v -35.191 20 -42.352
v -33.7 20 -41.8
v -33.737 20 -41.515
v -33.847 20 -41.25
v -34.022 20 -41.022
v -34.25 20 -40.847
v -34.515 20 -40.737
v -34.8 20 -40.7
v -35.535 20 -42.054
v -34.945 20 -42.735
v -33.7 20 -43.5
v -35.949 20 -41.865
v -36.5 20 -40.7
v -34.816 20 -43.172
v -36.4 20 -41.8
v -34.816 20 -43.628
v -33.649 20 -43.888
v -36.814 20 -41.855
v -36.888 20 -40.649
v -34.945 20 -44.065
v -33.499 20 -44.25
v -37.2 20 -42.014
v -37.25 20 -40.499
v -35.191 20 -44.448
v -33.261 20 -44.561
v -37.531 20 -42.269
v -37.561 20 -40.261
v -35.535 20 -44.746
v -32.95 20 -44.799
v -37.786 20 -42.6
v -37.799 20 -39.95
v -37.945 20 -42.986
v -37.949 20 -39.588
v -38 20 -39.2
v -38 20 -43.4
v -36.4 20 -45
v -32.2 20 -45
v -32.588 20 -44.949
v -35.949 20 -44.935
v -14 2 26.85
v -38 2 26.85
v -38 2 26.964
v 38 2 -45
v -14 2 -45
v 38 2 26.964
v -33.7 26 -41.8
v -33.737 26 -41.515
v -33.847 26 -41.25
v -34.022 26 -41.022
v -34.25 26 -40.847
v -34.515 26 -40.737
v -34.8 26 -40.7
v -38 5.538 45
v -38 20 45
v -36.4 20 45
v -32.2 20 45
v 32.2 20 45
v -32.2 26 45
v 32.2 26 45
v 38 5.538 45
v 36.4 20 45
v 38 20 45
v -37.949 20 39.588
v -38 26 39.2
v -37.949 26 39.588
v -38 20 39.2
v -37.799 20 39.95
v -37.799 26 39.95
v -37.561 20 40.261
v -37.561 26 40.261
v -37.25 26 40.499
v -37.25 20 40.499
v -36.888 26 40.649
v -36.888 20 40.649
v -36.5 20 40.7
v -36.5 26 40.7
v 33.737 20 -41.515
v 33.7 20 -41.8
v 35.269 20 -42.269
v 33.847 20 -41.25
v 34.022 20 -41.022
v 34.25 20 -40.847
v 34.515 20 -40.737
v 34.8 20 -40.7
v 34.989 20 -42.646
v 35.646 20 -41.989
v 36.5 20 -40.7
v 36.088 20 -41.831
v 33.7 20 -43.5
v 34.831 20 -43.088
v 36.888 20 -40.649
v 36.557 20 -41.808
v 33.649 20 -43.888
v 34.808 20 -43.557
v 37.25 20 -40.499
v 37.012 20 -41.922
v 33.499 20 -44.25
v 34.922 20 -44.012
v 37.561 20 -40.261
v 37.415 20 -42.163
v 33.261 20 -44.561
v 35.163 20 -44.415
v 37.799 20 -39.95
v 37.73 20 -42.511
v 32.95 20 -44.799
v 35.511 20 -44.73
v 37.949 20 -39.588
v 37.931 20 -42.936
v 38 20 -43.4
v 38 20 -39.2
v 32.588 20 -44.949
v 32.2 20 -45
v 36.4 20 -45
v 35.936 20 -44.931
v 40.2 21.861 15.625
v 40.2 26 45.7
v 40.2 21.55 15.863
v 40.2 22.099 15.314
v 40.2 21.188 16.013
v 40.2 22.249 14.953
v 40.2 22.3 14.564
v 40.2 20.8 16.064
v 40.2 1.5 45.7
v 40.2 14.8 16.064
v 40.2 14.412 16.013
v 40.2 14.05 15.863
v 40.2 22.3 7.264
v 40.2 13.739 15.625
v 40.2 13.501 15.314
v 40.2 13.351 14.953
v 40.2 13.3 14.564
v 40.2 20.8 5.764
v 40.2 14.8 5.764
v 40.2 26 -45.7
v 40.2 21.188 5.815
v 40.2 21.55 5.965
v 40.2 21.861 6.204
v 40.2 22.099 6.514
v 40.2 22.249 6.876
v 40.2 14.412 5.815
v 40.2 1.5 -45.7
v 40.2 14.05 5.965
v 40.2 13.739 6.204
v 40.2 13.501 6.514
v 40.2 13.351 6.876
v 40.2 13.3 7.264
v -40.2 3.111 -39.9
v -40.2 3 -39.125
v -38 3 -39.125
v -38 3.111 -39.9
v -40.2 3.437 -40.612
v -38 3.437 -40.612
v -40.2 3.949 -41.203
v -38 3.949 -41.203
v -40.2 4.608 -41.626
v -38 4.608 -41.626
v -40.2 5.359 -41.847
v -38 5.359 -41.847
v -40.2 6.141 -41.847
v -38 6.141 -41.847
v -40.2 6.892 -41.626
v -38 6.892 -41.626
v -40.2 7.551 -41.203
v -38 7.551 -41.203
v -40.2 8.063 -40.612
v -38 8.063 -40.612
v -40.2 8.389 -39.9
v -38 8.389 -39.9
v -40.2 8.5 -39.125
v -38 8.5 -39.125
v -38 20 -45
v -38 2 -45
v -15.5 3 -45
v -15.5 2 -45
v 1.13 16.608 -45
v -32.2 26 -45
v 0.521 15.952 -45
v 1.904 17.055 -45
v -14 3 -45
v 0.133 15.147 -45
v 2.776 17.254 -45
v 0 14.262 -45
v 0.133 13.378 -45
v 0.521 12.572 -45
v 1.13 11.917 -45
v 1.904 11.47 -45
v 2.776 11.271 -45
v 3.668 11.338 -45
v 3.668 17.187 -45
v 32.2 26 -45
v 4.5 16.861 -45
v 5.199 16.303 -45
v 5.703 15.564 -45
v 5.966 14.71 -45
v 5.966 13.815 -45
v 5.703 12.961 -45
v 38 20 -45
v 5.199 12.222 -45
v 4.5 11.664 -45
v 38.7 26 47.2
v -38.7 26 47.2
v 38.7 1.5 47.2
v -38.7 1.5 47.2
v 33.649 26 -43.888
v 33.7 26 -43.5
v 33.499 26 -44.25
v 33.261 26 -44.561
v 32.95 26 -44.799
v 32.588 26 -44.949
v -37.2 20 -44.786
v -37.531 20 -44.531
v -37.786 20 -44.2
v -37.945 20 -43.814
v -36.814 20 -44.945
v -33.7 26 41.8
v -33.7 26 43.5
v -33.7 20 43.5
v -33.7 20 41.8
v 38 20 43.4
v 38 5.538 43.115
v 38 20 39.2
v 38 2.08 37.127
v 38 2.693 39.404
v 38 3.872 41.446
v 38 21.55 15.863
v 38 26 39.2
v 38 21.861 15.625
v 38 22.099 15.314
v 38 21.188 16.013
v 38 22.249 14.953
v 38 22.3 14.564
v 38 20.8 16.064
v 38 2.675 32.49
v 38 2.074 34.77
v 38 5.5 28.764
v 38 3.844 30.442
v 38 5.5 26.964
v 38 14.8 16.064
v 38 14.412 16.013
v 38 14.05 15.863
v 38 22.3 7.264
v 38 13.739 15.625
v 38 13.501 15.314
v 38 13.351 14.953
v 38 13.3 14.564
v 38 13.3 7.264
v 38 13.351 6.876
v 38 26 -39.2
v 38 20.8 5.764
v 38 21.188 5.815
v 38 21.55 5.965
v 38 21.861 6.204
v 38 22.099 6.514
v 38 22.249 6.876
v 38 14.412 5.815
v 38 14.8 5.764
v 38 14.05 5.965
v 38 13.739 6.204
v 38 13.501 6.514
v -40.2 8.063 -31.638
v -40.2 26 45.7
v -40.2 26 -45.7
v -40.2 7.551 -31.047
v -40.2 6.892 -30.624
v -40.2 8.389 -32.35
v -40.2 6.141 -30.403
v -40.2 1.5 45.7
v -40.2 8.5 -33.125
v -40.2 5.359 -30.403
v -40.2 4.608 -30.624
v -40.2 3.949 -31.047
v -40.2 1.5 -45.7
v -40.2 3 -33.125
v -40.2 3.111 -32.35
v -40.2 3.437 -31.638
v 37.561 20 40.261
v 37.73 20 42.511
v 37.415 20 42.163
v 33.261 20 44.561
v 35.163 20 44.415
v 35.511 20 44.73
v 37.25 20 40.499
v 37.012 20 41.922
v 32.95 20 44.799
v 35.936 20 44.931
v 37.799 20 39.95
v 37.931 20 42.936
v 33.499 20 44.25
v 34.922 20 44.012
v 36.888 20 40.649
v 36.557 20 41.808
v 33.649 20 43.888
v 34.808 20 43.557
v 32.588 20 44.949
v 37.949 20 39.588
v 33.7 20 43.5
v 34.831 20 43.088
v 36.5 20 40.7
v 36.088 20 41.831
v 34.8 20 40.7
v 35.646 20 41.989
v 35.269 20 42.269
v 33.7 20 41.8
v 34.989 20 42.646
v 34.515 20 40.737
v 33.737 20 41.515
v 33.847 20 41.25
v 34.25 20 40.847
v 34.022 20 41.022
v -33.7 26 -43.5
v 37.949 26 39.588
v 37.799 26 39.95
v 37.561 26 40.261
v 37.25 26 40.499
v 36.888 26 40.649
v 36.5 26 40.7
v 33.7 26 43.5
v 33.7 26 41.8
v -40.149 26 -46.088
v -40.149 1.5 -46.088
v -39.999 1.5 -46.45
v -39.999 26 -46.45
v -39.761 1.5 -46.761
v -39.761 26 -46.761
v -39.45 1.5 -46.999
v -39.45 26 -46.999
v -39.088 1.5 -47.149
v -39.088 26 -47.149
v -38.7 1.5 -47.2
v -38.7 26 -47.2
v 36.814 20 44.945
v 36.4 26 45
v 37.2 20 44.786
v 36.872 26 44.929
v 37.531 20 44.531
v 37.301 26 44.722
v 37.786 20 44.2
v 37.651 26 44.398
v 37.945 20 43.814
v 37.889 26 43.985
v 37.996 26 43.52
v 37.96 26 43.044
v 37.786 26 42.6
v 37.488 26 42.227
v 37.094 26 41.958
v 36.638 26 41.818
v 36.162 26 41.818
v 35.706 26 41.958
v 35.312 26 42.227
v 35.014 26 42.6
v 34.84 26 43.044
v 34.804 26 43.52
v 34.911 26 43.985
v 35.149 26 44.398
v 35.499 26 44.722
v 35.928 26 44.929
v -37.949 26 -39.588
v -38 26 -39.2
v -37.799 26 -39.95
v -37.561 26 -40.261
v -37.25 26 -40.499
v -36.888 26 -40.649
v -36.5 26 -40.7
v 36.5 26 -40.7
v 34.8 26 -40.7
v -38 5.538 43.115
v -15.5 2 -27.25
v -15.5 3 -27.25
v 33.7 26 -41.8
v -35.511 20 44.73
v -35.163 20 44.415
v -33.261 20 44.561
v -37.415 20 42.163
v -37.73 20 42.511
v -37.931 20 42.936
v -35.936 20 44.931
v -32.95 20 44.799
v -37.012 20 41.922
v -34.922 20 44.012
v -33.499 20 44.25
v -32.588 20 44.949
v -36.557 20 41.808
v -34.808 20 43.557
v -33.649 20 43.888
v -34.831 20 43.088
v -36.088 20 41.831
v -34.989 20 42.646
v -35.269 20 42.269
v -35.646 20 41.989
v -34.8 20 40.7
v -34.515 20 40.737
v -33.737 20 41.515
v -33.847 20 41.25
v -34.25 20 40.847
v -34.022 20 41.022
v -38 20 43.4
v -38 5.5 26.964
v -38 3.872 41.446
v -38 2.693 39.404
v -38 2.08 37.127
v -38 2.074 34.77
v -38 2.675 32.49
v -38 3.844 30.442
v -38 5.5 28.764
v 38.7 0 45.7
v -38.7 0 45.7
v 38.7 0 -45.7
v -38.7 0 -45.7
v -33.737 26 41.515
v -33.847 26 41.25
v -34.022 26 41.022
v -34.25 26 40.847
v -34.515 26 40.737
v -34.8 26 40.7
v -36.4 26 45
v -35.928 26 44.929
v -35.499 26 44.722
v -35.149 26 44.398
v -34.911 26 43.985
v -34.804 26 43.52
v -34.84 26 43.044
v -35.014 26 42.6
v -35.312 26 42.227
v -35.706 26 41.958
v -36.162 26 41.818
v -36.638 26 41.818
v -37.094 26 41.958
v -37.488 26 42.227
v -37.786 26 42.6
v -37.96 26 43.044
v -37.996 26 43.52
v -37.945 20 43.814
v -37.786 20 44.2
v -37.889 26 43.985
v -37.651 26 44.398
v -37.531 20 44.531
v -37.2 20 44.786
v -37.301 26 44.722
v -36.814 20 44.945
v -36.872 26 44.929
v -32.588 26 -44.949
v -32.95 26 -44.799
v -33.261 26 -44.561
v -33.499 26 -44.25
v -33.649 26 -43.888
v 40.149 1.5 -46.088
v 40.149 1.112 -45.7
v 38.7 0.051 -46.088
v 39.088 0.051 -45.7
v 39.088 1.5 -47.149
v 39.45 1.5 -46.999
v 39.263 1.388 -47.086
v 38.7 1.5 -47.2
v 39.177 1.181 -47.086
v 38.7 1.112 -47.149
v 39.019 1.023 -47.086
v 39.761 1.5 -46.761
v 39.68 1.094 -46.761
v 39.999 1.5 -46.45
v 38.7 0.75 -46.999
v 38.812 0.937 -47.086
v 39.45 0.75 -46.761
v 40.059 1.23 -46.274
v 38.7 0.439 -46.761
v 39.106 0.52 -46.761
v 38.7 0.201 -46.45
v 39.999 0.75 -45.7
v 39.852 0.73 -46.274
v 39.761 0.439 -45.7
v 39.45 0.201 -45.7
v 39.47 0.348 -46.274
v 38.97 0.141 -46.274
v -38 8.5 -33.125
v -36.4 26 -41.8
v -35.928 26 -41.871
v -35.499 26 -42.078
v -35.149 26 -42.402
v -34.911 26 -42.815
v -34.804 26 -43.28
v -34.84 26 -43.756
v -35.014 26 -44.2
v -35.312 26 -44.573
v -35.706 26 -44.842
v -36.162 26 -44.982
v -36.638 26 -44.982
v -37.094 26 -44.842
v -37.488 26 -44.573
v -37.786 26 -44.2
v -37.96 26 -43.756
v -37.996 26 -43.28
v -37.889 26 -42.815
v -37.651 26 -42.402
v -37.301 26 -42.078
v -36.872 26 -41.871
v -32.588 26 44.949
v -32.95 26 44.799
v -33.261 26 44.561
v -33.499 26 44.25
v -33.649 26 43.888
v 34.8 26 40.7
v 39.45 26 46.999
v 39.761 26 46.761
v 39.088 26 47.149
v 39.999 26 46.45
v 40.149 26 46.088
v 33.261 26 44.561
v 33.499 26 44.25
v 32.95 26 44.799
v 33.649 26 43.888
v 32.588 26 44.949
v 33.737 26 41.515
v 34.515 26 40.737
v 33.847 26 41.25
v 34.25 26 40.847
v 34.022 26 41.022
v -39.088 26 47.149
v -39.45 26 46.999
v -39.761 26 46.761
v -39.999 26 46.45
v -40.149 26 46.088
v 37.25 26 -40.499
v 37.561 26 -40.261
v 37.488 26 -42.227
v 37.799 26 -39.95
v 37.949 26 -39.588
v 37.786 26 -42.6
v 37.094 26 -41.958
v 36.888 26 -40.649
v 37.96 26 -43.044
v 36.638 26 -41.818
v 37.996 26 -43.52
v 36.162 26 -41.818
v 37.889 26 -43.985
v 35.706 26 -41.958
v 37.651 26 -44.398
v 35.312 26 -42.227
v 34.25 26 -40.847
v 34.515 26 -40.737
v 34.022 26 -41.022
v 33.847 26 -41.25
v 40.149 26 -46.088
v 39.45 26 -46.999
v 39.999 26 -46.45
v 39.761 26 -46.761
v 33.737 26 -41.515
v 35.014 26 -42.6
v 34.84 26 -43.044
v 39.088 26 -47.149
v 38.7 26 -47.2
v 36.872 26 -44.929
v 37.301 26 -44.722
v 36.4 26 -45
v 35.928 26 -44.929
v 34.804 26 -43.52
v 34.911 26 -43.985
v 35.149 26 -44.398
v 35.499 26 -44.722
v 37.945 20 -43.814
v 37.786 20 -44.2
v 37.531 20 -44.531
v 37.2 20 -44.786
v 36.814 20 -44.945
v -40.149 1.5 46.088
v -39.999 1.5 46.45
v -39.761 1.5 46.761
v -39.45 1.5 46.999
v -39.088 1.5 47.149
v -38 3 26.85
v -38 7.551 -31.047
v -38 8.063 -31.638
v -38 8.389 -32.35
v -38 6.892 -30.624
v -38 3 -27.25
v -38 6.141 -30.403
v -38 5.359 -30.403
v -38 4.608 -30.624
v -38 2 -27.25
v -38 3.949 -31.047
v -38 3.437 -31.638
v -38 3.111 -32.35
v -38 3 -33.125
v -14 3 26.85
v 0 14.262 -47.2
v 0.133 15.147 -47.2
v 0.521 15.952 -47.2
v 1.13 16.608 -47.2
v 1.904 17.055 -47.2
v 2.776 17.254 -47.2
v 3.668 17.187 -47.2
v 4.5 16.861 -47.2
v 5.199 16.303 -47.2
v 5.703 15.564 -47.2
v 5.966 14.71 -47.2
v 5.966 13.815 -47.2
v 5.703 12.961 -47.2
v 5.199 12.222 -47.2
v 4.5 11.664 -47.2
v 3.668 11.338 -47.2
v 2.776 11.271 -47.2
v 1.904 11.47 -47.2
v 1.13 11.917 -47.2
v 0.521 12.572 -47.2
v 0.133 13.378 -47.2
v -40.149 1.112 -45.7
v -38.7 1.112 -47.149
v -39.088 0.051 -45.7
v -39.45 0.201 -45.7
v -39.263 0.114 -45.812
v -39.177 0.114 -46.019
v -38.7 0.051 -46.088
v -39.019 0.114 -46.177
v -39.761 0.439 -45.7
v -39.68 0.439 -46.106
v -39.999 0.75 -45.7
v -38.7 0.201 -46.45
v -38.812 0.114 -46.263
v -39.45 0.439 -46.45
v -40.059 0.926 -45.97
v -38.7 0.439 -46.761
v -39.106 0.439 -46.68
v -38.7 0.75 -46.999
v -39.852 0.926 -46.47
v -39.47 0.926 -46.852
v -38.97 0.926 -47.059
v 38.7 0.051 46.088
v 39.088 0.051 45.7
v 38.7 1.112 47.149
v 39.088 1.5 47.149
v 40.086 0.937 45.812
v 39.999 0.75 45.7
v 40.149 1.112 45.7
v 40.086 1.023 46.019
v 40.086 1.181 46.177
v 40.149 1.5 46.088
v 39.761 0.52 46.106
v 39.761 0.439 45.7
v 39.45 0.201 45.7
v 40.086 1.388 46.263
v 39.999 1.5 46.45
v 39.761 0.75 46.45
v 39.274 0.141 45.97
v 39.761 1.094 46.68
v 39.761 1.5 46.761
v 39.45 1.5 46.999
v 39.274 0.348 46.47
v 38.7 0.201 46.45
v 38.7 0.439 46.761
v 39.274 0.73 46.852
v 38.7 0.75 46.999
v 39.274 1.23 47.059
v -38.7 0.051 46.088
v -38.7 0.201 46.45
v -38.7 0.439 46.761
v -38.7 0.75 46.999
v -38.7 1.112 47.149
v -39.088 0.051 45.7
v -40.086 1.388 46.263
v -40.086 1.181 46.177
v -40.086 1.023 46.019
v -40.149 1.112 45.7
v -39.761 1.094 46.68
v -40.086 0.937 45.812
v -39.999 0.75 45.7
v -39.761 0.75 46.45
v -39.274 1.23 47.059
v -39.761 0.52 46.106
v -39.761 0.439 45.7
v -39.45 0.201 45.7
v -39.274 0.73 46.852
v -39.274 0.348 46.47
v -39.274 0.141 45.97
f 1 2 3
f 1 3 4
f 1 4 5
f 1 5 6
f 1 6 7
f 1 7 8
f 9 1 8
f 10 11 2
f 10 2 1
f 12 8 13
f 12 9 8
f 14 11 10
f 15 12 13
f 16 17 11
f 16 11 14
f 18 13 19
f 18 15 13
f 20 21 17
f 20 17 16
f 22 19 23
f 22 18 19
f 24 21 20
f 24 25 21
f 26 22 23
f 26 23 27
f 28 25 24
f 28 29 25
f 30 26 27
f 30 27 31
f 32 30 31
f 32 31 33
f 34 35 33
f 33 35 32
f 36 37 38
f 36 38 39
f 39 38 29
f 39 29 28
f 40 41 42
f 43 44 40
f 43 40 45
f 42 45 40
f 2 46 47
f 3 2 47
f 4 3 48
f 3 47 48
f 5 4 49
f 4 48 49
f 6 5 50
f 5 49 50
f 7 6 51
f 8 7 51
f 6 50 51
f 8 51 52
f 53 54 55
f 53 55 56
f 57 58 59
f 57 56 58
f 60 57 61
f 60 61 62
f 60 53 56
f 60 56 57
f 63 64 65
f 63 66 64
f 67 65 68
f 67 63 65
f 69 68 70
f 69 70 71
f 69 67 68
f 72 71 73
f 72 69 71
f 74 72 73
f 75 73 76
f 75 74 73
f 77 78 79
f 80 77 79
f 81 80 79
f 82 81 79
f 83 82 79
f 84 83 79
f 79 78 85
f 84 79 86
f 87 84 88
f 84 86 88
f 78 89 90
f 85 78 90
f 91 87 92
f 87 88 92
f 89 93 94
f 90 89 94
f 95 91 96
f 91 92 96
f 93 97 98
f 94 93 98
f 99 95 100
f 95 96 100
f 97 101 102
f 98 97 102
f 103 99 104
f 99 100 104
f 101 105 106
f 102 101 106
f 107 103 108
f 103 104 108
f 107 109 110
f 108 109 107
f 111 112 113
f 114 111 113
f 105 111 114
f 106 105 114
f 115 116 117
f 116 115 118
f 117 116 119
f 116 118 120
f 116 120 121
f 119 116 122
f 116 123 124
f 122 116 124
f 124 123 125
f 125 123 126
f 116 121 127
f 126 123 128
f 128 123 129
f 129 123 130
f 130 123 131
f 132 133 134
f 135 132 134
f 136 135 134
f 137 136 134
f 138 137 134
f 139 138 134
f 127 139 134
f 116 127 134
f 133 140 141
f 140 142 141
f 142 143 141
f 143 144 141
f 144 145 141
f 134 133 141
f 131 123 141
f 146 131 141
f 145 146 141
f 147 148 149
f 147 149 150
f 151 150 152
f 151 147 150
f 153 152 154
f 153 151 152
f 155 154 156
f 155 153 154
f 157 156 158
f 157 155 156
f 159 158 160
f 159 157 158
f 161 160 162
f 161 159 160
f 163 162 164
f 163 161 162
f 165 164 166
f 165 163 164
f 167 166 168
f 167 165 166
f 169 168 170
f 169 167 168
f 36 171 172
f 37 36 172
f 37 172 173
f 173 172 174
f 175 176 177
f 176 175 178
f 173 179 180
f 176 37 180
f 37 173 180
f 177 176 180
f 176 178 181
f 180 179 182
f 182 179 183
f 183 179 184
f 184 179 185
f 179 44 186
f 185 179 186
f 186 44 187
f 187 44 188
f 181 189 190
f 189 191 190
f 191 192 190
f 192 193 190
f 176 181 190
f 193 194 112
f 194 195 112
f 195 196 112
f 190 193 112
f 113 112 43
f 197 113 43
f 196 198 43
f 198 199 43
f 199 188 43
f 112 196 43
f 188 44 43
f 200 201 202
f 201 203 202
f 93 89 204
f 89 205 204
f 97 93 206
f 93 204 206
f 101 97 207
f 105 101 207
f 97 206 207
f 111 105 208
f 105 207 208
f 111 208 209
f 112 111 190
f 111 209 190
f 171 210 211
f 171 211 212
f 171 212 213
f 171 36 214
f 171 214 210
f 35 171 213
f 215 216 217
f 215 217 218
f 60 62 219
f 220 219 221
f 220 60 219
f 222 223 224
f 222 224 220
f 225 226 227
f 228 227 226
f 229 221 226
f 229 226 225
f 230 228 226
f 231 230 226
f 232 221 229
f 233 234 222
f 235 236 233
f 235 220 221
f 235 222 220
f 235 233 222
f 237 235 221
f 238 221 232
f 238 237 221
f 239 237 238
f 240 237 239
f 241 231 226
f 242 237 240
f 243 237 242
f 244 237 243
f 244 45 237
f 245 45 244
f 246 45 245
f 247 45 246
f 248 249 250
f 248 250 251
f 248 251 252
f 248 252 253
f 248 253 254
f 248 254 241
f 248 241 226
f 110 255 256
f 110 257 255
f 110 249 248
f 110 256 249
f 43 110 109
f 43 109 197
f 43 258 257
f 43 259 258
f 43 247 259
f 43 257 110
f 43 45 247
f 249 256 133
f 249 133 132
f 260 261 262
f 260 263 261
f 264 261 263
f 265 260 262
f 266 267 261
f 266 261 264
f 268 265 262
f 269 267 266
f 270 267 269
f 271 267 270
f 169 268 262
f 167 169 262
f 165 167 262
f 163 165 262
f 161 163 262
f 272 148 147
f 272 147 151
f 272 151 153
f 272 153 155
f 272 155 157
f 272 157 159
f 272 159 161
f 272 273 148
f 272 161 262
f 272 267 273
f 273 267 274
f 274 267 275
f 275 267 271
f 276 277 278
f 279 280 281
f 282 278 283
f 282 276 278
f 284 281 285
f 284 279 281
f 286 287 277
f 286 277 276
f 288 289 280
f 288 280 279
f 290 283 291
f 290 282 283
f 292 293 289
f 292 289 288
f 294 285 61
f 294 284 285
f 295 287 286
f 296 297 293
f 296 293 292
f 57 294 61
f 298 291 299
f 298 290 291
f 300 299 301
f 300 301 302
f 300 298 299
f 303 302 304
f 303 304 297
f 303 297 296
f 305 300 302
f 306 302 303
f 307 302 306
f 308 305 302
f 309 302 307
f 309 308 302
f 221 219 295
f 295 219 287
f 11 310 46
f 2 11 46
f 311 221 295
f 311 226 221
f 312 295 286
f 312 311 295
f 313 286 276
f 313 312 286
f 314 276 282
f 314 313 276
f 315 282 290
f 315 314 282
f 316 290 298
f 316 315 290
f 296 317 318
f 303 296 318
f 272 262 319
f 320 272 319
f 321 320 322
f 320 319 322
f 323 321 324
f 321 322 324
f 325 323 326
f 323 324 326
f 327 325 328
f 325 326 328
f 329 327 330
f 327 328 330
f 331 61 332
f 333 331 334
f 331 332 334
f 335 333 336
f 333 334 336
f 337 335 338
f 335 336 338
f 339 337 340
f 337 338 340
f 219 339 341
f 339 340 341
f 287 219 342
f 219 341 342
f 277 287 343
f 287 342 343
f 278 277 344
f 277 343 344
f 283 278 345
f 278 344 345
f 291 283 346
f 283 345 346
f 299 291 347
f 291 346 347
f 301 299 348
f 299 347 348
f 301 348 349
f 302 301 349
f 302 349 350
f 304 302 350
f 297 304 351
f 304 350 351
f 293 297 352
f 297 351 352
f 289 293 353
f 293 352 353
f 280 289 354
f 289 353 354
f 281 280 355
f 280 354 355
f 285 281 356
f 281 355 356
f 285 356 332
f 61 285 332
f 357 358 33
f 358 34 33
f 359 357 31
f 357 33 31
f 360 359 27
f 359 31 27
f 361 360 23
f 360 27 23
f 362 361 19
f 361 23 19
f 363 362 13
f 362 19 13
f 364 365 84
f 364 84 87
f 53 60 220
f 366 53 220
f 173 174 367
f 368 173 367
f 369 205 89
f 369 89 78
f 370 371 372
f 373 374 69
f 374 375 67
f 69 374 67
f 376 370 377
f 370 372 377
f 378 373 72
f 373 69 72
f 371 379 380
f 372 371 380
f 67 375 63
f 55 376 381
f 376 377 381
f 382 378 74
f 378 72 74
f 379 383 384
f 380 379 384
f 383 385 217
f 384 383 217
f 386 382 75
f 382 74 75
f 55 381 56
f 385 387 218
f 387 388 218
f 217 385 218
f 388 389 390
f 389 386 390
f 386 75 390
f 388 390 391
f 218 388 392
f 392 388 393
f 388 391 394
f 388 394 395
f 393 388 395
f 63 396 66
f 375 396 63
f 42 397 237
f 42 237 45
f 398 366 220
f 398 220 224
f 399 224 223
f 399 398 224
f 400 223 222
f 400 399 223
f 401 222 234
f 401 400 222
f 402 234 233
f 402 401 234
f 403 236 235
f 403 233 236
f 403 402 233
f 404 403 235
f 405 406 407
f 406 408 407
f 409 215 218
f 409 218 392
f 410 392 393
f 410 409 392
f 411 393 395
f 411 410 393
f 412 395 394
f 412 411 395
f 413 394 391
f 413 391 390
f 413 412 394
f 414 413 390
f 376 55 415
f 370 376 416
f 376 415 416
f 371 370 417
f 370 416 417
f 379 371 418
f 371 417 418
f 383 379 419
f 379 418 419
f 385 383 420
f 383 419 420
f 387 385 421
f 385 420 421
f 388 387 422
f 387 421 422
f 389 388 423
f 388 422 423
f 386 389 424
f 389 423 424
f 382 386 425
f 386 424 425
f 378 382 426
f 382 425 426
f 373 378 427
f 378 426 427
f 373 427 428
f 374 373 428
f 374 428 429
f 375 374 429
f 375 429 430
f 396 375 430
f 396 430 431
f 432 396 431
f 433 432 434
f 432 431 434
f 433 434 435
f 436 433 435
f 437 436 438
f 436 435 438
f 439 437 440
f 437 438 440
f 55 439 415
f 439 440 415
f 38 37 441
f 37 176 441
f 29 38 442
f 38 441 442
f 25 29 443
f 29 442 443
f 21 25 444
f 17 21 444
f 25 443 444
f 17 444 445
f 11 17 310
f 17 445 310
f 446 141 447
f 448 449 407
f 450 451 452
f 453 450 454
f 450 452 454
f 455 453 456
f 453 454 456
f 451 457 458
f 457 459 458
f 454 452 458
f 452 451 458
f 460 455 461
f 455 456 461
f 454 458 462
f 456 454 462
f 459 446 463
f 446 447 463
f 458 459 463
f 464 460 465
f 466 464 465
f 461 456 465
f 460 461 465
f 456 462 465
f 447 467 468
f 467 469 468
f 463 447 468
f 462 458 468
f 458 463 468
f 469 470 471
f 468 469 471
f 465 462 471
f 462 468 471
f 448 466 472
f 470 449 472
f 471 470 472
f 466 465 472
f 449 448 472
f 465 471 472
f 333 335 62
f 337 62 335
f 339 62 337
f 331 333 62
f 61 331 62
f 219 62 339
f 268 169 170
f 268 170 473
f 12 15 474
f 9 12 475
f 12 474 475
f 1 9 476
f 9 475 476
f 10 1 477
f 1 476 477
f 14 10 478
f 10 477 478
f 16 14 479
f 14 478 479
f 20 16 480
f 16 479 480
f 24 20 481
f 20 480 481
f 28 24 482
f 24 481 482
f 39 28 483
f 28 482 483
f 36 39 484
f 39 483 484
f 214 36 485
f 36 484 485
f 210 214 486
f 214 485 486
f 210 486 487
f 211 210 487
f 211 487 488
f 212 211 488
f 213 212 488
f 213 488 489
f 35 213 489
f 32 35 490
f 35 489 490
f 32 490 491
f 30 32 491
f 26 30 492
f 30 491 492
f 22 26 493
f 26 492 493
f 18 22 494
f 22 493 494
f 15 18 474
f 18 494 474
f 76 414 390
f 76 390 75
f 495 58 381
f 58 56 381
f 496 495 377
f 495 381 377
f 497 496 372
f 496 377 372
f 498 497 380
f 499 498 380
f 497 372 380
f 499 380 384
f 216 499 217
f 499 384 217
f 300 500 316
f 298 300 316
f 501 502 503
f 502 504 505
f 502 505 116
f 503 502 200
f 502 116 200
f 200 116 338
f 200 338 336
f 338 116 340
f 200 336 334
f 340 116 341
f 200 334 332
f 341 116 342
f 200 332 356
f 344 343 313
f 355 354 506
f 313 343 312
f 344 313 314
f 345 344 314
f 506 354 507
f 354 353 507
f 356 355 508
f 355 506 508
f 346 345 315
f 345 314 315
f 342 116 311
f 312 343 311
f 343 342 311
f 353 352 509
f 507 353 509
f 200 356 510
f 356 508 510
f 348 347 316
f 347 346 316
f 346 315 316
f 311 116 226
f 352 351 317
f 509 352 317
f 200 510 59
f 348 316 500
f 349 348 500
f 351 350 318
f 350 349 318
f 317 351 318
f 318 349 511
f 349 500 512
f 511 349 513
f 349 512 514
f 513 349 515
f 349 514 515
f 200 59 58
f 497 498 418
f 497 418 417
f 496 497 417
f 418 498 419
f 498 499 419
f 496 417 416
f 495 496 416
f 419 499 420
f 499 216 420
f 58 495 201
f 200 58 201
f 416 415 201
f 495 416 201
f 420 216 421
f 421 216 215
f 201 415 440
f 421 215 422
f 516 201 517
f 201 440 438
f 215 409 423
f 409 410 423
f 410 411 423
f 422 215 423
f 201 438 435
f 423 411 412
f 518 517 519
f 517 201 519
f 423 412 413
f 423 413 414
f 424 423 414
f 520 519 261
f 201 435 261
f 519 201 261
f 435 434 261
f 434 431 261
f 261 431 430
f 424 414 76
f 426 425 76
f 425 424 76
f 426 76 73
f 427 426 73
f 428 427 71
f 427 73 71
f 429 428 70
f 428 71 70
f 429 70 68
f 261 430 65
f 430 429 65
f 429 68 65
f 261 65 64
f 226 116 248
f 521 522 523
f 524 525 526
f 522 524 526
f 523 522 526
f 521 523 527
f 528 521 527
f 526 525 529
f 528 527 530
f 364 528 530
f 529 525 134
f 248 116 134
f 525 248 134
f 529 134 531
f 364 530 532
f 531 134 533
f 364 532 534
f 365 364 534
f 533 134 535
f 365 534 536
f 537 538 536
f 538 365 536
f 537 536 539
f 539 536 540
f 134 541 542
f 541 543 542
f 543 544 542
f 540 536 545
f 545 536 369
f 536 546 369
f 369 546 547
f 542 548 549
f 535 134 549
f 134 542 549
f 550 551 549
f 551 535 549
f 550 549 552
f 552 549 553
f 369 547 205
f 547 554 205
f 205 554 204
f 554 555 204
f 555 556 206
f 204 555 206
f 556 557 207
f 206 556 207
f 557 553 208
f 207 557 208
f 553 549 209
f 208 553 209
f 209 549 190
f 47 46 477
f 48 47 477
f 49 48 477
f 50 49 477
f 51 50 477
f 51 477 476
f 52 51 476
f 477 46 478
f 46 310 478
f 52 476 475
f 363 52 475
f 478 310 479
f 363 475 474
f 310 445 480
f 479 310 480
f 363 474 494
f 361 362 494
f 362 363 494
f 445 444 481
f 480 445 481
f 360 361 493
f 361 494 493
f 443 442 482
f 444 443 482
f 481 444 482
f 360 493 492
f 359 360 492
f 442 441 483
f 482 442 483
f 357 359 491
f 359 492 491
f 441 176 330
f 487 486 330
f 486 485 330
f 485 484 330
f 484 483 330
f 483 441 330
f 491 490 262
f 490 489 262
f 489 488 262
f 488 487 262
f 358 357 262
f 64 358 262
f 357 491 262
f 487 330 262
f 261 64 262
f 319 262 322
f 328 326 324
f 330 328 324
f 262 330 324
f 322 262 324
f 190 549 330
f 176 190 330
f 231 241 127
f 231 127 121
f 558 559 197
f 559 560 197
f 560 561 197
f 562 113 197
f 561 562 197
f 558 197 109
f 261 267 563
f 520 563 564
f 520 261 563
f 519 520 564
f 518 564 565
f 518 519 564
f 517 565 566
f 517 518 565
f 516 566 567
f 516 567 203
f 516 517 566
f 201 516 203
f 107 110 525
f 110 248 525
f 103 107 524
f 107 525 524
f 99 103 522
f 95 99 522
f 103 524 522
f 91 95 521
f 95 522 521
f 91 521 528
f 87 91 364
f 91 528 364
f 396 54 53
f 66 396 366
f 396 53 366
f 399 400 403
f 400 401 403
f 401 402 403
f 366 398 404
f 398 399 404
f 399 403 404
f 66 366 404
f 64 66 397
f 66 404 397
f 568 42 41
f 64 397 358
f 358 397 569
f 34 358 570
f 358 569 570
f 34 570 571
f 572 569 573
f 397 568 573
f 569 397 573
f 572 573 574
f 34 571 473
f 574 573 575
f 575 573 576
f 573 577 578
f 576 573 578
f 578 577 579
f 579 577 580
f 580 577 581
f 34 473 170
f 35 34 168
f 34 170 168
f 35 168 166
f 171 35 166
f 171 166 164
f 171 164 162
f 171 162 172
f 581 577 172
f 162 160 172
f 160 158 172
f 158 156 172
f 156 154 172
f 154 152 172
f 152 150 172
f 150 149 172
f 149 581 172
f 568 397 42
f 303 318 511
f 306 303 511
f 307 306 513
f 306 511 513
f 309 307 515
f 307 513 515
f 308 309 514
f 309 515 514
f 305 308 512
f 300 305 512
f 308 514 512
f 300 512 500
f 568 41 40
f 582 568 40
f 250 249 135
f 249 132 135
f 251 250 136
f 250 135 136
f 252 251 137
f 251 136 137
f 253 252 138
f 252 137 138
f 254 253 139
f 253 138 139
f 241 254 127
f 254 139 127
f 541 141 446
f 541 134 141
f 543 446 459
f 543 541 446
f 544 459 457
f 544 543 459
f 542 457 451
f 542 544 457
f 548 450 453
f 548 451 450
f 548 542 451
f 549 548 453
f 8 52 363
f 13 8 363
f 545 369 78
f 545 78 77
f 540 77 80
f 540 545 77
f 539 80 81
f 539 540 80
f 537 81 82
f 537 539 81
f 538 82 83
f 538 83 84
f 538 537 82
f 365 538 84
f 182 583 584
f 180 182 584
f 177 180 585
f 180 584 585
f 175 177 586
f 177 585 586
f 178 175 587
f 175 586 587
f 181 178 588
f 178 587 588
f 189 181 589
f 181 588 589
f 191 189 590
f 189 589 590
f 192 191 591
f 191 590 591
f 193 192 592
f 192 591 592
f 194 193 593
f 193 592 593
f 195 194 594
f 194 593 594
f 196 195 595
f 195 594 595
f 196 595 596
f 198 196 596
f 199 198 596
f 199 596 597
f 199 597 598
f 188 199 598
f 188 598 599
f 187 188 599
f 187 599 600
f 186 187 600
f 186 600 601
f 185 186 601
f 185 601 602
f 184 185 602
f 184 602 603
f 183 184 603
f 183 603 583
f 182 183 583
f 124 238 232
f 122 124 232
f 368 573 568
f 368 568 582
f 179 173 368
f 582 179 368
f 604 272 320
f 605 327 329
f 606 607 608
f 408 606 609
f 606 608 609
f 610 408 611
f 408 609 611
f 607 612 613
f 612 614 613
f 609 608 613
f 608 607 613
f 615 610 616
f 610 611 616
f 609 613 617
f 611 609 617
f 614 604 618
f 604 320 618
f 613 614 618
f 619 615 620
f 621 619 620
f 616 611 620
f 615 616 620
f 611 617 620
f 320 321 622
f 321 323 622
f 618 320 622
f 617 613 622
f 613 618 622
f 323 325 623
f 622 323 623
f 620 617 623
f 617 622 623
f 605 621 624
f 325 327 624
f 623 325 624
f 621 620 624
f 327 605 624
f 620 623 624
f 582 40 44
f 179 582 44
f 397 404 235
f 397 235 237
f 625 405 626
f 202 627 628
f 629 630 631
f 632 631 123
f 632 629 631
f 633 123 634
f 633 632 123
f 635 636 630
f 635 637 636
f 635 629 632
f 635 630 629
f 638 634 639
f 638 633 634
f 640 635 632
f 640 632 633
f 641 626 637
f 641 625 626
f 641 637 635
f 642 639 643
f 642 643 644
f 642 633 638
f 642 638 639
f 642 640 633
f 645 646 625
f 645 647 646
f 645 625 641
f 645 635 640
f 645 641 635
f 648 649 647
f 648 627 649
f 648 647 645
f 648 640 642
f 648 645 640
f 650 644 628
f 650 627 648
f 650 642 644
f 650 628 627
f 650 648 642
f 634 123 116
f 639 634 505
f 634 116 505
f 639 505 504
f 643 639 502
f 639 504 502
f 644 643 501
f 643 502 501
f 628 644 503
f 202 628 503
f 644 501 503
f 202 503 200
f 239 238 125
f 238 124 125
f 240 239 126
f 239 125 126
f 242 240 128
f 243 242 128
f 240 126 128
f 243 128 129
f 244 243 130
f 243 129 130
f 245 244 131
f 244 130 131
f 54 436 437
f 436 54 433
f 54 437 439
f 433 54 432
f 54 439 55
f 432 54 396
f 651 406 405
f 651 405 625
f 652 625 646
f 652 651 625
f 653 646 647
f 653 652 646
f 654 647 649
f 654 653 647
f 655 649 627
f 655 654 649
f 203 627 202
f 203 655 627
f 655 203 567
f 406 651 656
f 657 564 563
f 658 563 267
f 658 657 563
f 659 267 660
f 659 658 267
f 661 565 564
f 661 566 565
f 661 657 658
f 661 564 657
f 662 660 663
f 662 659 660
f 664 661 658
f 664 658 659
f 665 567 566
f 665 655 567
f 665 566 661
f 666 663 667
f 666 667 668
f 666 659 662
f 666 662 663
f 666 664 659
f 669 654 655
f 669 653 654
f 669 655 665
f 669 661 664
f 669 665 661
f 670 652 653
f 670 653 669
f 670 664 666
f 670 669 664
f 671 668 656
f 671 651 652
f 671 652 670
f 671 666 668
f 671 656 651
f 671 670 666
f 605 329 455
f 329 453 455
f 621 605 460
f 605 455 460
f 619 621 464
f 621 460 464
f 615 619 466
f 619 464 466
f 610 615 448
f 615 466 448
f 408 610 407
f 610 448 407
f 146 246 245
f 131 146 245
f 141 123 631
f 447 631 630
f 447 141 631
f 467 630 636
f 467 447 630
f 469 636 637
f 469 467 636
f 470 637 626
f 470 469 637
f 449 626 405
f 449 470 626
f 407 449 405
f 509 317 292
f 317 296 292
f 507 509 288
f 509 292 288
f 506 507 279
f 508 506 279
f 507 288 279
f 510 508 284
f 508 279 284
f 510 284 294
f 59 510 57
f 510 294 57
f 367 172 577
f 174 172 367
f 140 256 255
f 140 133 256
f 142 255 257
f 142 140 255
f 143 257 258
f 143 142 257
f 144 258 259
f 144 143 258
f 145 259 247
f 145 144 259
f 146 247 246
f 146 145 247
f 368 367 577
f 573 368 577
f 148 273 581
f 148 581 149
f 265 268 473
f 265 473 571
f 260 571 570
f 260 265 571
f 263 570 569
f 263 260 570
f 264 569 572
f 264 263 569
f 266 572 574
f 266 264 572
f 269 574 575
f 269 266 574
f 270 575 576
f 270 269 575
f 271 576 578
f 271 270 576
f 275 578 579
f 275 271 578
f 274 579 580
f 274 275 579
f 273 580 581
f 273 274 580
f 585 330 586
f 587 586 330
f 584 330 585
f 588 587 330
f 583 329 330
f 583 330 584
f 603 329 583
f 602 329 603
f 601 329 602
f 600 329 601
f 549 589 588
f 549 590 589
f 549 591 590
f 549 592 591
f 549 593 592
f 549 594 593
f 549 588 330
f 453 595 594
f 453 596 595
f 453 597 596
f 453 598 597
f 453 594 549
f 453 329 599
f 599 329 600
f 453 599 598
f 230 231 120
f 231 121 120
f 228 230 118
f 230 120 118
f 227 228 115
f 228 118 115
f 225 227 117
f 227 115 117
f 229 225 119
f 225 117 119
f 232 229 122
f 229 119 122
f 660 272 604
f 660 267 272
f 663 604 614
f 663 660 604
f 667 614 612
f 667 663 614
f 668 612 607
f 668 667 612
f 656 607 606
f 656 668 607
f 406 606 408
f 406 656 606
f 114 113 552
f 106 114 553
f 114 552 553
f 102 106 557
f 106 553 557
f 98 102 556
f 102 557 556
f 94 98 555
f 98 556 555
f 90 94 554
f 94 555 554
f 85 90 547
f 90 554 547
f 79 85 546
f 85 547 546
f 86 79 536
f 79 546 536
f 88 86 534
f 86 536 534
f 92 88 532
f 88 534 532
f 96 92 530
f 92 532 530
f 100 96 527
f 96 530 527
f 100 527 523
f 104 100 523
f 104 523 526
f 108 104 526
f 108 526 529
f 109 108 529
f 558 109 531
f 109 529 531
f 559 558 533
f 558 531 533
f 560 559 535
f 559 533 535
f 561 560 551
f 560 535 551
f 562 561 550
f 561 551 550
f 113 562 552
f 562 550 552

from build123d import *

# Parameters (mm, degrees)
SKETCH1_W           = 22.5
SKETCH1_H           = 17.75
SKETCH1_W_2         = 52
SKETCH1_H_2         = 71.85
BOSS_EXTRUDE1_DEPTH = 2
BOSS_EXTRUDE2_DEPTH = 3
SKETCH1_4_W         = 80.4
SKETCH1_4_H         = 94.4
SKETCH1_4_W_2       = 76
SKETCH1_4_H_2       = 90
BOSS_EXTRUDE3_DEPTH = 26
BOSS_EXTRUDE4_DEPTH = 78.2
CUT_EXTRUDE1_START  = -78.2
SKETCH2_3_W         = 10.3
SKETCH2_3_H         = 9
CUT_EXTRUDE1_DEPTH  = 26
CUT_EXTRUDE2_DEPTH  = 26
FILLET1_R           = 1.5
SKETCH4_R           = 3
CUT_EXTRUDE3_DEPTH  = 26
SKETCH5_R           = 1.6
BOSS_EXTRUDE5_DEPTH = 6
FILLET2_R           = 1.5


with BuildPart() as part:
    # Sketch1 → Boss-Extrude1 (new body)
    with BuildSketch(Plane(origin=(0, 0, 0), x_dir=(1, 0, 0), z_dir=(0, 1, 0))):
        Polygon((-38, -26.85), (-14, -26.85), (-14, 45), (-15.5, 45), (-15.5, 27.25), (-38, 27.25), align=None)
        with Locations((-26.75, 36.125)):
            Rectangle(SKETCH1_W, SKETCH1_H)
        with Locations((12, 9.075)):
            Rectangle(SKETCH1_W_2, SKETCH1_H_2)
        Polygon((38, -45), (38, -26.85), (-14, -26.85), (-38, -26.85), (-38, -45), align=None)
    extrude(amount=BOSS_EXTRUDE1_DEPTH)

    # Sketch1<3> → Boss-Extrude2 (add)
    with BuildSketch(Plane(origin=(0, 0, 0), x_dir=(1, 0, 0), z_dir=(0, 1, 0))):
        Polygon((-38, -26.85), (-14, -26.85), (-14, 45), (-15.5, 45), (-15.5, 27.25), (-38, 27.25), align=None)
    extrude(amount=BOSS_EXTRUDE2_DEPTH)

    # Sketch1<4> → Boss-Extrude3 (add)
    with BuildSketch(Plane(origin=(0, 0, 0), x_dir=(1, 0, 0), z_dir=(0, 1, 0))):
        Rectangle(SKETCH1_4_W, SKETCH1_4_H)
        Rectangle(SKETCH1_4_W_2, SKETCH1_4_H_2, mode=Mode.SUBTRACT)
    extrude(amount=BOSS_EXTRUDE3_DEPTH)

    # Sketch2 → Boss-Extrude4 (add)
    with BuildSketch(Plane.ZY.offset(40.2)):
        with BuildLine():
            Line((28.764343606, 5.5), (26.964343606, 5.5))
            Line((26.964343606, 5.5), (26.964343606, 0))
            Line((26.964343606, 0), (41.904953918, 0))
            Line((41.904953918, 0), (47.2, 0))
            Line((47.2, 0), (47.2, 5.5375))
            Line((47.2, 5.5375), (45, 5.5375))
            Line((45, 5.5375), (43.114695317, 5.5375))
            ThreePointArc((43.114695317, 5.5375), (35.948714495, 2.000030985), (28.764343606, 5.5))
        make_face()
    extrude(amount=-BOSS_EXTRUDE4_DEPTH)

    # Sketch2<3> → Cut-Extrude1 (cut)
    with BuildSketch(Plane.ZY.offset(40.2).offset(CUT_EXTRUDE1_START)):
        with Locations((10.914343606, 17.8)):
            Rectangle(SKETCH2_3_W, SKETCH2_3_H)
    extrude(amount=-CUT_EXTRUDE1_DEPTH, mode=Mode.SUBTRACT)

    # Sketch3 → Cut-Extrude2 (cut)
    with BuildSketch(Plane.ZY.offset(40.2)):
        with BuildLine():
            Line((-39.125, 8.5), (-33.125, 8.5))
            ThreePointArc((-33.125, 8.5), (-30.375, 5.75), (-33.125, 3))
            Line((-33.125, 3), (-39.125, 3))
            ThreePointArc((-39.125, 3), (-41.875, 5.75), (-39.125, 8.5))
        make_face()
    extrude(amount=-CUT_EXTRUDE2_DEPTH, mode=Mode.SUBTRACT)

    # Fillet1
    fillet1_edges = [part.edges().sort_by_distance(p)[0] for p in [
        (39.1, 22.3, 16.064343606),
        (39.1, 13.3, 16.064343606),
        (39.1, 13.3, 5.764343606),
        (39.1, 22.3, 5.764343606),
        (0, 0, 47.2),
        (-40.2, 13, 47.2),
        (40.2, 0, 0),
        (40.2, 13, 47.2),
        (40.2, 13, -47.2),
        (-40.2, 13, -47.2),
        (-40.2, 0, 0),
        (0, 0, -47.2),
    ]]
    fillet(fillet1_edges, radius=FILLET1_R)

    # Sketch4 → Cut-Extrude3 (cut)
    with BuildSketch(Plane(origin=(0, 0, -47.2), x_dir=(-1, 0, 0), z_dir=(0, 0, -1))):
        with Locations((-3, 14.26242493)):
            Circle(SKETCH4_R)
    extrude(amount=-CUT_EXTRUDE3_DEPTH, mode=Mode.SUBTRACT)

    # Sketch5 → Boss-Extrude5 (add)
    # profile 1 of 4: a face of its own
    with BuildSketch(Plane(origin=(0, 26, 0), x_dir=(1, 0, 0), z_dir=(0, 1, 0))):
        with BuildLine():
            Line((-33.7, 45), (-33.7, 41.8))
            ThreePointArc((-33.7, 41.8), (-34.022182541, 41.022182541), (-34.8, 40.7))
            Line((-34.8, 40.7), (-38, 40.7))
            Line((-38, 40.7), (-39.1, 40.7))
            Line((-39.1, 40.7), (-39.1, 46.1))
            Line((-39.1, 46.1), (-33.7, 46.1))
            Line((-33.7, 46.1), (-33.7, 45))
        make_face()
        with Locations(Location((-36.4, 43.4, 0), (0, 0, 270))):
            Circle(SKETCH5_R, mode=Mode.SUBTRACT)
    # profile 2 of 4: a face of its own
    with BuildSketch(Plane(origin=(0, 26, 0), x_dir=(1, 0, 0), z_dir=(0, 1, 0))):
        with BuildLine():
            Line((33.7, 46.1), (33.7, 45))
            Line((33.7, 45), (33.7, 41.8))
            ThreePointArc((33.7, 41.8), (34.022182541, 41.022182541), (34.8, 40.7))
            Line((34.8, 40.7), (38, 40.7))
            Line((38, 40.7), (39.1, 40.7))
            Line((39.1, 40.7), (39.1, 46.1))
            Line((39.1, 46.1), (33.7, 46.1))
        make_face()
        with Locations(Location((36.4, 43.4, 0), (0, 0, 90))):
            Circle(SKETCH5_R, mode=Mode.SUBTRACT)
    # profile 3 of 4: a face of its own
    with BuildSketch(Plane(origin=(0, 26, 0), x_dir=(1, 0, 0), z_dir=(0, 1, 0))):
        with BuildLine():
            Line((33.7, -45), (33.7, -41.8))
            ThreePointArc((33.7, -41.8), (34.022182541, -41.022182541), (34.8, -40.7))
            Line((34.8, -40.7), (38, -40.7))
            Line((38, -40.7), (39.1, -40.7))
            Line((39.1, -40.7), (39.1, -46.1))
            Line((39.1, -46.1), (33.7, -46.1))
            Line((33.7, -46.1), (33.7, -45))
        make_face()
        with Locations(Location((36.4, -43.4, 0), (0, 0, 270))):
            Circle(SKETCH5_R, mode=Mode.SUBTRACT)
    # profile 4 of 4: a face of its own
    with BuildSketch(Plane(origin=(0, 26, 0), x_dir=(1, 0, 0), z_dir=(0, 1, 0))):
        with BuildLine():
            Line((-33.7, -46.1), (-33.7, -45))
            Line((-33.7, -45), (-33.7, -41.8))
            ThreePointArc((-33.7, -41.8), (-34.022182541, -41.022182541), (-34.8, -40.7))
            Line((-34.8, -40.7), (-38, -40.7))
            Line((-38, -40.7), (-39.1, -40.7))
            Line((-39.1, -40.7), (-39.1, -46.1))
            Line((-39.1, -46.1), (-33.7, -46.1))
        make_face()
        with Locations(Location((-36.4, -43.4, 0), (0, 0, 270))):
            Circle(SKETCH5_R, mode=Mode.SUBTRACT)
    extrude(amount=-BOSS_EXTRUDE5_DEPTH)

    # Fillet2
    fillet2_edges = [part.edges().sort_by_distance(p)[0] for p in [
        (-33.7, 23, -45),
        (-38, 23, -40.7),
        (33.7, 23, -45),
        (38, 23, -40.7),
        (38, 23, 40.7),
        (33.7, 23, 45),
        (-33.7, 23, 45),
        (-38, 23, 40.7),
    ]]
    fillet(fillet2_edges, radius=FILLET2_R)


solid = part.part
